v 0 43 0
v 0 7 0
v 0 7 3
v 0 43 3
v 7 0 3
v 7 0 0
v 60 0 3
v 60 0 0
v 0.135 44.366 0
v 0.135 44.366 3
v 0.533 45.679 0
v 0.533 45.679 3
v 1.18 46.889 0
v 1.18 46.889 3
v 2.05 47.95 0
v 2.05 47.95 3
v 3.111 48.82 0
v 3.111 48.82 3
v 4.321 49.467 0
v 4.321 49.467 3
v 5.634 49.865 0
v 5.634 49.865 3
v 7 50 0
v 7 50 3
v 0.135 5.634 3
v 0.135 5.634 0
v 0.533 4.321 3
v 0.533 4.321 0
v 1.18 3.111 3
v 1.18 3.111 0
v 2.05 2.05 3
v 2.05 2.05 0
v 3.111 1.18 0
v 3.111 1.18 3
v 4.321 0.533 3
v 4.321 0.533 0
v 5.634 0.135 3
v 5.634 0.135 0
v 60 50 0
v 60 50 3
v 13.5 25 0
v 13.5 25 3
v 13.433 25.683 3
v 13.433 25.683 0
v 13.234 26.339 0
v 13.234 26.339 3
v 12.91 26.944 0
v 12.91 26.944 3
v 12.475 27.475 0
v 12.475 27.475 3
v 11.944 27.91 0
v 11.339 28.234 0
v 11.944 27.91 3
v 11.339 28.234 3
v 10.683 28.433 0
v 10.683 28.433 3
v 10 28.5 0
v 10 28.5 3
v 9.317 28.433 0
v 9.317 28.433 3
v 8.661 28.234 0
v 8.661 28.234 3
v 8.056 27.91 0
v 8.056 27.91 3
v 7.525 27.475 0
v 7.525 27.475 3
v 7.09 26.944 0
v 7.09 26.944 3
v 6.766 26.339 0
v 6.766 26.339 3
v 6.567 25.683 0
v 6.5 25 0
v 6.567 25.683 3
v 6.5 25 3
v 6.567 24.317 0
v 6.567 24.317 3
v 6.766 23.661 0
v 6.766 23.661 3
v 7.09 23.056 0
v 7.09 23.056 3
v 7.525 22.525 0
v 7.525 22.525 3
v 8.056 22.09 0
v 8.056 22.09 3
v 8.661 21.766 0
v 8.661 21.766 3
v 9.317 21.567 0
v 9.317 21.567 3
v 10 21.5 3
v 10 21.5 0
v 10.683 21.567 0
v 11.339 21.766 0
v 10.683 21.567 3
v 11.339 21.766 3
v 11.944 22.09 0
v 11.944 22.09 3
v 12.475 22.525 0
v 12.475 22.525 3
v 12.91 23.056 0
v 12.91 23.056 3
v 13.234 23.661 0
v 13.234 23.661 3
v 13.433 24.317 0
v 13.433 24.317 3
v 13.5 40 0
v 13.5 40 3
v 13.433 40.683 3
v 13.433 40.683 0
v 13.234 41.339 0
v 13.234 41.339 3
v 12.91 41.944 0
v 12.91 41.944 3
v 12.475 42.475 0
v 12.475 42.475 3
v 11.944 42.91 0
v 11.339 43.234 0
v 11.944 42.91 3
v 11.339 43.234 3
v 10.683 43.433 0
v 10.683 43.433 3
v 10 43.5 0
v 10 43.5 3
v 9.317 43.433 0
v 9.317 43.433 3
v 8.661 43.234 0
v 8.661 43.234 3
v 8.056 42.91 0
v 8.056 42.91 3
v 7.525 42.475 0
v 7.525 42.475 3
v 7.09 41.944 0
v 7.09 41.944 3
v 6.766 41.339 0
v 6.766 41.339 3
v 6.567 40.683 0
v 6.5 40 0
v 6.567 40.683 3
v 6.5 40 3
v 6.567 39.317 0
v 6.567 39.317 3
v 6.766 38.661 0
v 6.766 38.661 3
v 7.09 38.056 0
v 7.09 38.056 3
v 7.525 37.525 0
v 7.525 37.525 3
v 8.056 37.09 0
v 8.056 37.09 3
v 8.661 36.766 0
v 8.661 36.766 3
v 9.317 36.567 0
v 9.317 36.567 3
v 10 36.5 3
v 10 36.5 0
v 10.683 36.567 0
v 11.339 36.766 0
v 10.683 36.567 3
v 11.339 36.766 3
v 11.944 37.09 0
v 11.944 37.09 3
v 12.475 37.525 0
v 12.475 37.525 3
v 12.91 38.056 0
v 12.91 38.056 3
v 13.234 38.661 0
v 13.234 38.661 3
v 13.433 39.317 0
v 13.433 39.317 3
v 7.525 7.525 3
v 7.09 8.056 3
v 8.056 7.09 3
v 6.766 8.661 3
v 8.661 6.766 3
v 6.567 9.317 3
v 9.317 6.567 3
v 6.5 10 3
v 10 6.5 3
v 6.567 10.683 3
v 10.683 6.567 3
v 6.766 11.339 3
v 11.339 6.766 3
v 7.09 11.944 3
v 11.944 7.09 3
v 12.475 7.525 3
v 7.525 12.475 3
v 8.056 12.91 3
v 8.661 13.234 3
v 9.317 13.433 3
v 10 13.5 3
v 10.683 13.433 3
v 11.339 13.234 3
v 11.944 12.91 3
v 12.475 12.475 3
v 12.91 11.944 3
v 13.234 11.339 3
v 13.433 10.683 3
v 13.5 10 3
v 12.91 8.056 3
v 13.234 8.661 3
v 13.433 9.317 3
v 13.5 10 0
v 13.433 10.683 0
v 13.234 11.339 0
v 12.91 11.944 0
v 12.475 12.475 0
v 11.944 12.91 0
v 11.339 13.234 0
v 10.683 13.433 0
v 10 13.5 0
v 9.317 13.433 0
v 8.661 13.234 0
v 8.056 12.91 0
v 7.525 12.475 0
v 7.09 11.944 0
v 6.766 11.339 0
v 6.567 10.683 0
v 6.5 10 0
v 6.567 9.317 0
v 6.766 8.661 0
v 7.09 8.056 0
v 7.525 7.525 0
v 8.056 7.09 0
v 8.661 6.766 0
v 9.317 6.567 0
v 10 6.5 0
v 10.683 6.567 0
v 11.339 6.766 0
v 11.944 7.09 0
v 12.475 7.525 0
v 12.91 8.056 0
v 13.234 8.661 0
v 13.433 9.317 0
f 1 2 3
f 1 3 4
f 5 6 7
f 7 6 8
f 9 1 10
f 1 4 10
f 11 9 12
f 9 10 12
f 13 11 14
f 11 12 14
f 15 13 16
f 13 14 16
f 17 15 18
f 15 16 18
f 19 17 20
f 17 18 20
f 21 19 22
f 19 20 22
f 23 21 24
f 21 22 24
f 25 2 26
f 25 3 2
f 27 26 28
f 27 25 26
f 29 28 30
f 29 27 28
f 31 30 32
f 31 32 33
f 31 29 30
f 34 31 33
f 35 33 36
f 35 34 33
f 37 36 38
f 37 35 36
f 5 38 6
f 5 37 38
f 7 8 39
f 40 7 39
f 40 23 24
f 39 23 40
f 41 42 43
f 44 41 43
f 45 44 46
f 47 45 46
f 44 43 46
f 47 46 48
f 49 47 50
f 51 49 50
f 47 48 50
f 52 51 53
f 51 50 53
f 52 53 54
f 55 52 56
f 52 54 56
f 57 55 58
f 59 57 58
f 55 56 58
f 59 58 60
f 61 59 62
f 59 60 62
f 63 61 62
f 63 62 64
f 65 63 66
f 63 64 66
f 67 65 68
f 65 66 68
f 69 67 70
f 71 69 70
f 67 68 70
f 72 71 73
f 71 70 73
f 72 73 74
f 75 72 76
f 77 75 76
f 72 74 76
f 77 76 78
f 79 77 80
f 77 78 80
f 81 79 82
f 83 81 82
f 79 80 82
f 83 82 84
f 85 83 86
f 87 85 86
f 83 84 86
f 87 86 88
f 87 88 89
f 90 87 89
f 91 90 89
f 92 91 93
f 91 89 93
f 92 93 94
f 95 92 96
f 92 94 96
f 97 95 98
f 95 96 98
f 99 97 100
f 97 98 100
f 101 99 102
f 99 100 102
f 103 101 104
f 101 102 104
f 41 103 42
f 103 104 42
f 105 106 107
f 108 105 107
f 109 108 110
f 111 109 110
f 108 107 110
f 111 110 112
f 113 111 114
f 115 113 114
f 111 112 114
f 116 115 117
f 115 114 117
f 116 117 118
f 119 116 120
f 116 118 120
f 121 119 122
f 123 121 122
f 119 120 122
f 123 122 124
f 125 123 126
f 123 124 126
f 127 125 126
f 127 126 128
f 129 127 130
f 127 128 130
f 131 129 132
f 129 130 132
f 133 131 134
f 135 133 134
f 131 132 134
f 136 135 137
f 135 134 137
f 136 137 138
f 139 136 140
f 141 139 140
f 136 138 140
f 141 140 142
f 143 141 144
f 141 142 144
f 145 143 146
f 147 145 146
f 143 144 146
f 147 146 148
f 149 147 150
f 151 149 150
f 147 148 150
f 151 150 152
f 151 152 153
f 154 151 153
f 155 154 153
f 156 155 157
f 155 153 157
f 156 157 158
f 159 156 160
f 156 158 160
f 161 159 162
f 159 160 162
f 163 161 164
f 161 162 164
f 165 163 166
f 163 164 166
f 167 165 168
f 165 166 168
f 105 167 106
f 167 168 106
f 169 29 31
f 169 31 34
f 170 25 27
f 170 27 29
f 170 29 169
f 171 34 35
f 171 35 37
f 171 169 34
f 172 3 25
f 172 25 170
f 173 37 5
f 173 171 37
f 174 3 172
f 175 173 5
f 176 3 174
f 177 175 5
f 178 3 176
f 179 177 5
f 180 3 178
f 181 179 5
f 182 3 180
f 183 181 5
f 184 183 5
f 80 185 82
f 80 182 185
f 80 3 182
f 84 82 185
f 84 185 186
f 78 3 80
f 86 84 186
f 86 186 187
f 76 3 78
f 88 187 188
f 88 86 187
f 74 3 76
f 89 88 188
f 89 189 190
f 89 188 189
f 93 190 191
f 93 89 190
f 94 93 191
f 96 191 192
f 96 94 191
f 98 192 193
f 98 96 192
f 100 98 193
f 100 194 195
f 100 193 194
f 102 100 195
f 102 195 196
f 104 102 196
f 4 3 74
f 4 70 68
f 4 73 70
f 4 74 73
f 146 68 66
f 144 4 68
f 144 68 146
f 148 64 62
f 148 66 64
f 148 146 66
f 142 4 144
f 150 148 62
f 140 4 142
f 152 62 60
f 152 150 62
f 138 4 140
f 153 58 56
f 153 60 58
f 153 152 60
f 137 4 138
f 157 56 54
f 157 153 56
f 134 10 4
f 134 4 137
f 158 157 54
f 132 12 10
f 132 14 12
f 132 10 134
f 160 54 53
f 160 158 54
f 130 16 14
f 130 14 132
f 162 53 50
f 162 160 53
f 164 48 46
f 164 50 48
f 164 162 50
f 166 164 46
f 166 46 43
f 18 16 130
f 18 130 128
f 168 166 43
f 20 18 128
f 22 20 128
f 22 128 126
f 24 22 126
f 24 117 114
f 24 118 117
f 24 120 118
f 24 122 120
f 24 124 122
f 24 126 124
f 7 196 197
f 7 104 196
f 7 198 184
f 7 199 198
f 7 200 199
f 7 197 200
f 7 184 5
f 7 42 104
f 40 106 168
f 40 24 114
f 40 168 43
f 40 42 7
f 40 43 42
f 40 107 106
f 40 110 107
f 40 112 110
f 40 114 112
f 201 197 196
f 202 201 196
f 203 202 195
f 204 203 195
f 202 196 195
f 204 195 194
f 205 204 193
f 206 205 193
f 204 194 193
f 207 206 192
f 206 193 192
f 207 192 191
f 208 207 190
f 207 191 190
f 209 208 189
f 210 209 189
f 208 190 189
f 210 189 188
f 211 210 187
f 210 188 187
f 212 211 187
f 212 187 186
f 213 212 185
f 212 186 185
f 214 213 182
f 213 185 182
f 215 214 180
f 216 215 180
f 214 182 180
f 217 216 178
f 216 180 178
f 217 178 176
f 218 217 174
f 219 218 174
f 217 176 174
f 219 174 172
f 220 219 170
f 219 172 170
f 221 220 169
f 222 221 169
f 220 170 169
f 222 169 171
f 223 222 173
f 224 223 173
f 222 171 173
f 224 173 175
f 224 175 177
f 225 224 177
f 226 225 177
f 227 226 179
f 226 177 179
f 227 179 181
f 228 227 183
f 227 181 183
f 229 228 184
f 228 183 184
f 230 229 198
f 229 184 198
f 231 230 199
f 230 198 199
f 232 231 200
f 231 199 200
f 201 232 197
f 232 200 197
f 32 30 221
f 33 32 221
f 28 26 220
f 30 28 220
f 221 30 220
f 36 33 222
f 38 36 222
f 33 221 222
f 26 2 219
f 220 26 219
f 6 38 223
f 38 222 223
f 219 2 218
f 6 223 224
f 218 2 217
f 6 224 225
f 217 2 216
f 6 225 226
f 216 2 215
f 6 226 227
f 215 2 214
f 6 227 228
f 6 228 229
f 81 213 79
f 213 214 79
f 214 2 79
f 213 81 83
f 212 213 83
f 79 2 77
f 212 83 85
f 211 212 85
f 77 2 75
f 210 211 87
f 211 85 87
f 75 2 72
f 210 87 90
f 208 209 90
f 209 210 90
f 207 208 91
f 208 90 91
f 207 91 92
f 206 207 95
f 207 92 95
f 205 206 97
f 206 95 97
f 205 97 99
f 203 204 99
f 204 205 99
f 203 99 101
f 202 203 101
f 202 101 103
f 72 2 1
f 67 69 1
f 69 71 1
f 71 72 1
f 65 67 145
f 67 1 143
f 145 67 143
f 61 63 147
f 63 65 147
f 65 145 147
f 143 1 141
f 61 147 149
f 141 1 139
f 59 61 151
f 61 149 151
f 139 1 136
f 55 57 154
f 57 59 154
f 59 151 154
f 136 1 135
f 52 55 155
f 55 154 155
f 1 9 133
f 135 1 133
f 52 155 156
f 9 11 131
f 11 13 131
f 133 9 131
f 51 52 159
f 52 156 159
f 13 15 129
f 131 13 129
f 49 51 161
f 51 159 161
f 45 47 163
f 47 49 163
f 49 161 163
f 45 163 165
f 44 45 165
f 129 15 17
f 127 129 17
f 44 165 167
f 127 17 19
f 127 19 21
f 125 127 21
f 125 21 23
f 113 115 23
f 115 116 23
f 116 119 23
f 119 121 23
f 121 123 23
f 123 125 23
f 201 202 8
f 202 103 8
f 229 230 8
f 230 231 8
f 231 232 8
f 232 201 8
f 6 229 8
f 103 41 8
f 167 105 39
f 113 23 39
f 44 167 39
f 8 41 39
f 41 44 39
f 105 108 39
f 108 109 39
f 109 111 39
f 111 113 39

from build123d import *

# Parameters (mm, degrees)
ESQUISSE1_W             = 60
ESQUISSE1_H             = 50
BOSS_EXTRU_1_DEPTH      = 3
ESQUISSE2_R             = 3.5
ENL_V_MAT_EXTRU_1_DEPTH = 3
CONG_1_R                = 7


with BuildPart() as part:
    # Esquisse1 → Boss.-Extru.1 (new body)
    with BuildSketch(Plane.XY):
        with Locations((30, 25)):
            Rectangle(ESQUISSE1_W, ESQUISSE1_H)
    extrude(amount=BOSS_EXTRU_1_DEPTH)

    # Esquisse2 → Enlèv. mat.-Extru.1 (cut)
    with BuildSketch(Plane.XY.offset(3)):
        with Locations((10, 10)):
            Circle(ESQUISSE2_R)
        with Locations((10, 25)):
            Circle(ESQUISSE2_R)
        with Locations((10, 40)):
            Circle(ESQUISSE2_R)
    extrude(amount=-ENL_V_MAT_EXTRU_1_DEPTH, mode=Mode.SUBTRACT)

    # Congé1
    cong_1_edges = [part.edges().sort_by_distance(p)[0] for p in [
        (0, 50, 1.5),
        (0, 0, 1.5),
    ]]
    fillet(cong_1_edges, radius=CONG_1_R)


solid = part.part
